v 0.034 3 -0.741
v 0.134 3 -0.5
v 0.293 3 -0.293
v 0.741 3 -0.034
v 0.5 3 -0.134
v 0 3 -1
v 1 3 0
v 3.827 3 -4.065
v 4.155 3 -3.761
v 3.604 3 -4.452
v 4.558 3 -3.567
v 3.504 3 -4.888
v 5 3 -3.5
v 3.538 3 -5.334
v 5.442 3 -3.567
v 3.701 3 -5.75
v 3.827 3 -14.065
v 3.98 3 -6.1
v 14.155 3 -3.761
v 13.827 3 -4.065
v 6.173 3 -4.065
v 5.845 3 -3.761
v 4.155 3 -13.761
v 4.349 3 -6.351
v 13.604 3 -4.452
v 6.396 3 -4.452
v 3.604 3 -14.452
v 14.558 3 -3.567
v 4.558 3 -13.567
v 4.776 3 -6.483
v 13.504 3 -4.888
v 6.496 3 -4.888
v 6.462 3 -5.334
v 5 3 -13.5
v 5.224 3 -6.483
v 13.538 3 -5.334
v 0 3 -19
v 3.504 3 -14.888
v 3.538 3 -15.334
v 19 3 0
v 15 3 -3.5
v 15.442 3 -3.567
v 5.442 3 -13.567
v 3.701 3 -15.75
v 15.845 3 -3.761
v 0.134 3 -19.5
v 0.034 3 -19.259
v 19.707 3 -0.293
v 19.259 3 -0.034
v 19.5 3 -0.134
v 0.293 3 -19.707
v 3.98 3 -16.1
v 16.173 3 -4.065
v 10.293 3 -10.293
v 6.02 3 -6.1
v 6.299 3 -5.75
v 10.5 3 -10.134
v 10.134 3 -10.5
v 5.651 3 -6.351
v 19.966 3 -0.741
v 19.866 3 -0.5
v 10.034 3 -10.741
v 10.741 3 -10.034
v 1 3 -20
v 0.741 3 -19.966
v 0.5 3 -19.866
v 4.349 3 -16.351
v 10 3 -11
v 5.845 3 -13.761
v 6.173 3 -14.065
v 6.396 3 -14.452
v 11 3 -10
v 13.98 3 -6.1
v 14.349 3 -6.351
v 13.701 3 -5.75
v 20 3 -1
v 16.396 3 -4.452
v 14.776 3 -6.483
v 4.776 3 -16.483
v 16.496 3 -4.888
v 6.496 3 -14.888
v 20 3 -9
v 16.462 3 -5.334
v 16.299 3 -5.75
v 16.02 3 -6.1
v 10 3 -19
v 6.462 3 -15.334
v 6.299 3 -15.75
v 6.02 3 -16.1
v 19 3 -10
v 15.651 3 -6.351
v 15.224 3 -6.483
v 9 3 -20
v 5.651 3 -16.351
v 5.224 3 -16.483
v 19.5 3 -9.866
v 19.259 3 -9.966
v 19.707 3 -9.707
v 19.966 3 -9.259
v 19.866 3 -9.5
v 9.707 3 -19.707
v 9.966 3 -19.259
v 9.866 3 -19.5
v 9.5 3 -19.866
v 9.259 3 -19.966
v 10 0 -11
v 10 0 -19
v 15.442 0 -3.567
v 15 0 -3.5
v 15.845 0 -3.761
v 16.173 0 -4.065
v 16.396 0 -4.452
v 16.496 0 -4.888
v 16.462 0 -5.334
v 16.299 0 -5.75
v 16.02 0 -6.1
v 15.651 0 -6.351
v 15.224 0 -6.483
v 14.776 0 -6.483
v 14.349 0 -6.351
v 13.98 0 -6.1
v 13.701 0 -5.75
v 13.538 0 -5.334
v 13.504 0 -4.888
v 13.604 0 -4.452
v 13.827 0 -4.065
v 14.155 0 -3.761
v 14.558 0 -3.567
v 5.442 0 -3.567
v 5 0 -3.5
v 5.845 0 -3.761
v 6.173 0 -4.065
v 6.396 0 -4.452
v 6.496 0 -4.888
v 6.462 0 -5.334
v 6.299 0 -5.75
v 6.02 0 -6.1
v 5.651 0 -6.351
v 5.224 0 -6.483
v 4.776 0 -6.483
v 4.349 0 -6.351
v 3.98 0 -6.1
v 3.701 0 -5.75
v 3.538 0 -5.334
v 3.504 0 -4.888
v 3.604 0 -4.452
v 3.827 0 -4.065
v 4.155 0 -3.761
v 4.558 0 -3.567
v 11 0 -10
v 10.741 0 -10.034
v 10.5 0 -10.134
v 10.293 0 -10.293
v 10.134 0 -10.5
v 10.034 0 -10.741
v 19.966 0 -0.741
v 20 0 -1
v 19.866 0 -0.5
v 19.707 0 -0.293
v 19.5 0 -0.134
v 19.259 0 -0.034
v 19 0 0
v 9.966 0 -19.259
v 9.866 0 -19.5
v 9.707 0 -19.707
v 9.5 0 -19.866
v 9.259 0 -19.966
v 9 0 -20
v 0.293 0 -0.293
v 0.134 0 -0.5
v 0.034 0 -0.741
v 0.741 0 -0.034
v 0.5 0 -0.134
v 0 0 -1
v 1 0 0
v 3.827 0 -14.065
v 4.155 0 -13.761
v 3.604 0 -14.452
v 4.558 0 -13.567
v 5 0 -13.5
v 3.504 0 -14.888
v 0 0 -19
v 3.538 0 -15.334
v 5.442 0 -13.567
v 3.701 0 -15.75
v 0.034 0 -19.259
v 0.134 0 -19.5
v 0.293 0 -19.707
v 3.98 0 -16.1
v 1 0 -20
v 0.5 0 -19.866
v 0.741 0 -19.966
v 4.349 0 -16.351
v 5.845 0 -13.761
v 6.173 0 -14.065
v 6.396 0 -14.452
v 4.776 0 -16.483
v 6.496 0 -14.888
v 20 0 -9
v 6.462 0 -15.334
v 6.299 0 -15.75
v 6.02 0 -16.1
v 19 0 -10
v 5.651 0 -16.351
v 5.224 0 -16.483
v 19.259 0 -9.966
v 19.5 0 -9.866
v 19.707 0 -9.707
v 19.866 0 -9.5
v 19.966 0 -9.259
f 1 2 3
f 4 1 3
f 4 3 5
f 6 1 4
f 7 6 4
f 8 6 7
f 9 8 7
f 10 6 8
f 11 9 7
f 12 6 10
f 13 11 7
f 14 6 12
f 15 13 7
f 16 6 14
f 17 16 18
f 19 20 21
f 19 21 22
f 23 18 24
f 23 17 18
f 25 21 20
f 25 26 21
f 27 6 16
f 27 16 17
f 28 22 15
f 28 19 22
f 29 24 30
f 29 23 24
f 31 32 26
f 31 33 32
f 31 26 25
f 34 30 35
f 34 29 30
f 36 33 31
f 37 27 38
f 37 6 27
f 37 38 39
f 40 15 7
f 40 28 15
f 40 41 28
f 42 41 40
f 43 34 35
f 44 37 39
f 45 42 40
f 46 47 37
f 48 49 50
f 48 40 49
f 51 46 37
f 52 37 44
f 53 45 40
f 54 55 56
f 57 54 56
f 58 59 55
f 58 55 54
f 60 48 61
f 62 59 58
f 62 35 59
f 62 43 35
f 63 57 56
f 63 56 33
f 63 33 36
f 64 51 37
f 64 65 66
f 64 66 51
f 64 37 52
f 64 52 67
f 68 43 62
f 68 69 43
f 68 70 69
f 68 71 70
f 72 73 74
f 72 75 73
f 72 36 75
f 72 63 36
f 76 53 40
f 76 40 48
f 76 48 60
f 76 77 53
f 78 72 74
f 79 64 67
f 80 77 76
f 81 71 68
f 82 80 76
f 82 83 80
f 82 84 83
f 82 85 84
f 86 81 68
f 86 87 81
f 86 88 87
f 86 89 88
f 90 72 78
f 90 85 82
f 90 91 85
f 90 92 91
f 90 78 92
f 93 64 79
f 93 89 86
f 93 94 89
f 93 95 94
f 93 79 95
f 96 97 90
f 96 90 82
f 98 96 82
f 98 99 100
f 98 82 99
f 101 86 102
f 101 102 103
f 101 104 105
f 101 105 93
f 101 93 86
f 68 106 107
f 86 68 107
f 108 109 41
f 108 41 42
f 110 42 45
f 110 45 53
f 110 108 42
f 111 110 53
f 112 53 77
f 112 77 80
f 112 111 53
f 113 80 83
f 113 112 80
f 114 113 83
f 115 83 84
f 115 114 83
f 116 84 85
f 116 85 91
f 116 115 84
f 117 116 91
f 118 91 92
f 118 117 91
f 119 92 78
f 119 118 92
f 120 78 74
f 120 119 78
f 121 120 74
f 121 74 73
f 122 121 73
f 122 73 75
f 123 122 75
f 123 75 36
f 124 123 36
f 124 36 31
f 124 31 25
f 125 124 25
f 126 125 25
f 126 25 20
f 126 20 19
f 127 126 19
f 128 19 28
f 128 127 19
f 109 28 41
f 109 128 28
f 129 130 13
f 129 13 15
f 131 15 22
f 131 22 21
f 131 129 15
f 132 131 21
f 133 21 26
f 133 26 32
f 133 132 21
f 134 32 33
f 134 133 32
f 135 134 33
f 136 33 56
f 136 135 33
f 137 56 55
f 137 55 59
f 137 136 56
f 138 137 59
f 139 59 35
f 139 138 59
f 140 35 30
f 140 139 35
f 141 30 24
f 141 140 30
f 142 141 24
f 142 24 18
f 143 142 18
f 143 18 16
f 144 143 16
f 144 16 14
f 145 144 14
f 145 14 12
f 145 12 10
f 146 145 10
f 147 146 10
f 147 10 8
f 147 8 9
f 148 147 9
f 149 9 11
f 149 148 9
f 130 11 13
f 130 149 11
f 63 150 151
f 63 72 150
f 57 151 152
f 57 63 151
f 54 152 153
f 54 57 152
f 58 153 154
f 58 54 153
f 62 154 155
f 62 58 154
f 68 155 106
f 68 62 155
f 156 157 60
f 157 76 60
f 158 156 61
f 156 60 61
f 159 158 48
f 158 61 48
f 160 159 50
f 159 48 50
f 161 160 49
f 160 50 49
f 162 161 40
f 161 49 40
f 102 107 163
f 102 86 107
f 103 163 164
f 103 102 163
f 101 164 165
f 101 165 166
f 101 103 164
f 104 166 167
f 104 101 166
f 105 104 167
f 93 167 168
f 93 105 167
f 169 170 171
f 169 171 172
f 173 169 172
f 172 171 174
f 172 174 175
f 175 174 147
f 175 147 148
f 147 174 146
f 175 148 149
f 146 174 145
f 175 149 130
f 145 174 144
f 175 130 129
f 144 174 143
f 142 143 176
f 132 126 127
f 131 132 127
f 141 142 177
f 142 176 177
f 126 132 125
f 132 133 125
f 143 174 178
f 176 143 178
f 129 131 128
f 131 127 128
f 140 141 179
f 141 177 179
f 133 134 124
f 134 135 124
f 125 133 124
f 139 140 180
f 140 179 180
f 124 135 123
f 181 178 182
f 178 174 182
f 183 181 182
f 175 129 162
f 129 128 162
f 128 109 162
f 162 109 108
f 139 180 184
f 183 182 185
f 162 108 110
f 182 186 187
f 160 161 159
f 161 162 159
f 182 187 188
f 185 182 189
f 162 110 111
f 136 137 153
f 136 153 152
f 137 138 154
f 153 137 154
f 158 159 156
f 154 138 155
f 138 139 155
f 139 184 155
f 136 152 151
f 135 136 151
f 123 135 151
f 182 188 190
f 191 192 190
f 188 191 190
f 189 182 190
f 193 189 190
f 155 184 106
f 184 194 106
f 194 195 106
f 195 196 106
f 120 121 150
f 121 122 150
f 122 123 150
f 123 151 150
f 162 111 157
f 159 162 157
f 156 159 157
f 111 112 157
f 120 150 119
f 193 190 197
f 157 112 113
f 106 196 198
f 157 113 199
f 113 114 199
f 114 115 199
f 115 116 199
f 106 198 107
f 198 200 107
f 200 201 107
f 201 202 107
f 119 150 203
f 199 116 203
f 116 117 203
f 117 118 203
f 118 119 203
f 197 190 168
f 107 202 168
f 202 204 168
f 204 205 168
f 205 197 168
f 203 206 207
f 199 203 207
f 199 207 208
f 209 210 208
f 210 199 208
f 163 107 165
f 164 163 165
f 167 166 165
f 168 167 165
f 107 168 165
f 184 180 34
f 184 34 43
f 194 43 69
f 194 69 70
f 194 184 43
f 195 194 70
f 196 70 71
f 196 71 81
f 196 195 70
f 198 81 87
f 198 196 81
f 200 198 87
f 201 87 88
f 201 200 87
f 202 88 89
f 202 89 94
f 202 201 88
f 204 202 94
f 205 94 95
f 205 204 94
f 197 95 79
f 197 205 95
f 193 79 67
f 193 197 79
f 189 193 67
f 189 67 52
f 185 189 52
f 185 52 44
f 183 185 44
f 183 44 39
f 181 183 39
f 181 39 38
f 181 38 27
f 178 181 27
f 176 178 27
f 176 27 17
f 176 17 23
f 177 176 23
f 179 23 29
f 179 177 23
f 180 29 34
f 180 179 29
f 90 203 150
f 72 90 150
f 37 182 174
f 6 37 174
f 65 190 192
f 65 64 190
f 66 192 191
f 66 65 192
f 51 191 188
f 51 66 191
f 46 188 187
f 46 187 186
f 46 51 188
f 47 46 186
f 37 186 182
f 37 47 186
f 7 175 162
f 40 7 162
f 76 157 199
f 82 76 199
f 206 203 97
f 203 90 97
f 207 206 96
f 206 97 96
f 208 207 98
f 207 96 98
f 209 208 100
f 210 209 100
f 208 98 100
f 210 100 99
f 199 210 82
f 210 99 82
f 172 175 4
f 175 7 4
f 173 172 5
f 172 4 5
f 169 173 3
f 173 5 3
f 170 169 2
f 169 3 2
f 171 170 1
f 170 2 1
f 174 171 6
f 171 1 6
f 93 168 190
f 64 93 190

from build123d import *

# Parameters (mm, degrees)
SKETCH1_R           = 1.5
BOSS_EXTRUDE1_DEPTH = 3
FILLET1_R           = 1
FILLET2_R           = 1


with BuildPart() as part:
    # Sketch1 → Boss-Extrude1 (new body)
    with BuildSketch(Plane(origin=(0, 0, 0), x_dir=(1, 0, 0), z_dir=(0, 1, 0))):
        Polygon((0, 0), (10, 0), (20, 0), (20, 10), (10, 10), (10, 20), (0, 20), align=None)
        with Locations(Location((5, 15, 0), (0, 0, 270))):
            Circle(SKETCH1_R, mode=Mode.SUBTRACT)
        with Locations(Location((5, 5, 0), (0, 0, 270))):
            Circle(SKETCH1_R, mode=Mode.SUBTRACT)
        with Locations(Location((15, 5, 0), (0, 0, 270))):
            Circle(SKETCH1_R, mode=Mode.SUBTRACT)
    extrude(amount=BOSS_EXTRUDE1_DEPTH)

    # Fillet1
    fillet1_edges = [part.edges().sort_by_distance(p)[0] for p in [
        (10, 1.5, -10),
    ]]
    fillet(fillet1_edges, radius=FILLET1_R)

    # Fillet2
    fillet2_edges = [part.edges().sort_by_distance(p)[0] for p in [
        (0, 1.5, -20),
        (10, 1.5, -20),
        (20, 1.5, -10),
        (20, 1.5, 0),
        (0, 1.5, 0),
    ]]
    fillet(fillet2_edges, radius=FILLET2_R)


solid = part.part
